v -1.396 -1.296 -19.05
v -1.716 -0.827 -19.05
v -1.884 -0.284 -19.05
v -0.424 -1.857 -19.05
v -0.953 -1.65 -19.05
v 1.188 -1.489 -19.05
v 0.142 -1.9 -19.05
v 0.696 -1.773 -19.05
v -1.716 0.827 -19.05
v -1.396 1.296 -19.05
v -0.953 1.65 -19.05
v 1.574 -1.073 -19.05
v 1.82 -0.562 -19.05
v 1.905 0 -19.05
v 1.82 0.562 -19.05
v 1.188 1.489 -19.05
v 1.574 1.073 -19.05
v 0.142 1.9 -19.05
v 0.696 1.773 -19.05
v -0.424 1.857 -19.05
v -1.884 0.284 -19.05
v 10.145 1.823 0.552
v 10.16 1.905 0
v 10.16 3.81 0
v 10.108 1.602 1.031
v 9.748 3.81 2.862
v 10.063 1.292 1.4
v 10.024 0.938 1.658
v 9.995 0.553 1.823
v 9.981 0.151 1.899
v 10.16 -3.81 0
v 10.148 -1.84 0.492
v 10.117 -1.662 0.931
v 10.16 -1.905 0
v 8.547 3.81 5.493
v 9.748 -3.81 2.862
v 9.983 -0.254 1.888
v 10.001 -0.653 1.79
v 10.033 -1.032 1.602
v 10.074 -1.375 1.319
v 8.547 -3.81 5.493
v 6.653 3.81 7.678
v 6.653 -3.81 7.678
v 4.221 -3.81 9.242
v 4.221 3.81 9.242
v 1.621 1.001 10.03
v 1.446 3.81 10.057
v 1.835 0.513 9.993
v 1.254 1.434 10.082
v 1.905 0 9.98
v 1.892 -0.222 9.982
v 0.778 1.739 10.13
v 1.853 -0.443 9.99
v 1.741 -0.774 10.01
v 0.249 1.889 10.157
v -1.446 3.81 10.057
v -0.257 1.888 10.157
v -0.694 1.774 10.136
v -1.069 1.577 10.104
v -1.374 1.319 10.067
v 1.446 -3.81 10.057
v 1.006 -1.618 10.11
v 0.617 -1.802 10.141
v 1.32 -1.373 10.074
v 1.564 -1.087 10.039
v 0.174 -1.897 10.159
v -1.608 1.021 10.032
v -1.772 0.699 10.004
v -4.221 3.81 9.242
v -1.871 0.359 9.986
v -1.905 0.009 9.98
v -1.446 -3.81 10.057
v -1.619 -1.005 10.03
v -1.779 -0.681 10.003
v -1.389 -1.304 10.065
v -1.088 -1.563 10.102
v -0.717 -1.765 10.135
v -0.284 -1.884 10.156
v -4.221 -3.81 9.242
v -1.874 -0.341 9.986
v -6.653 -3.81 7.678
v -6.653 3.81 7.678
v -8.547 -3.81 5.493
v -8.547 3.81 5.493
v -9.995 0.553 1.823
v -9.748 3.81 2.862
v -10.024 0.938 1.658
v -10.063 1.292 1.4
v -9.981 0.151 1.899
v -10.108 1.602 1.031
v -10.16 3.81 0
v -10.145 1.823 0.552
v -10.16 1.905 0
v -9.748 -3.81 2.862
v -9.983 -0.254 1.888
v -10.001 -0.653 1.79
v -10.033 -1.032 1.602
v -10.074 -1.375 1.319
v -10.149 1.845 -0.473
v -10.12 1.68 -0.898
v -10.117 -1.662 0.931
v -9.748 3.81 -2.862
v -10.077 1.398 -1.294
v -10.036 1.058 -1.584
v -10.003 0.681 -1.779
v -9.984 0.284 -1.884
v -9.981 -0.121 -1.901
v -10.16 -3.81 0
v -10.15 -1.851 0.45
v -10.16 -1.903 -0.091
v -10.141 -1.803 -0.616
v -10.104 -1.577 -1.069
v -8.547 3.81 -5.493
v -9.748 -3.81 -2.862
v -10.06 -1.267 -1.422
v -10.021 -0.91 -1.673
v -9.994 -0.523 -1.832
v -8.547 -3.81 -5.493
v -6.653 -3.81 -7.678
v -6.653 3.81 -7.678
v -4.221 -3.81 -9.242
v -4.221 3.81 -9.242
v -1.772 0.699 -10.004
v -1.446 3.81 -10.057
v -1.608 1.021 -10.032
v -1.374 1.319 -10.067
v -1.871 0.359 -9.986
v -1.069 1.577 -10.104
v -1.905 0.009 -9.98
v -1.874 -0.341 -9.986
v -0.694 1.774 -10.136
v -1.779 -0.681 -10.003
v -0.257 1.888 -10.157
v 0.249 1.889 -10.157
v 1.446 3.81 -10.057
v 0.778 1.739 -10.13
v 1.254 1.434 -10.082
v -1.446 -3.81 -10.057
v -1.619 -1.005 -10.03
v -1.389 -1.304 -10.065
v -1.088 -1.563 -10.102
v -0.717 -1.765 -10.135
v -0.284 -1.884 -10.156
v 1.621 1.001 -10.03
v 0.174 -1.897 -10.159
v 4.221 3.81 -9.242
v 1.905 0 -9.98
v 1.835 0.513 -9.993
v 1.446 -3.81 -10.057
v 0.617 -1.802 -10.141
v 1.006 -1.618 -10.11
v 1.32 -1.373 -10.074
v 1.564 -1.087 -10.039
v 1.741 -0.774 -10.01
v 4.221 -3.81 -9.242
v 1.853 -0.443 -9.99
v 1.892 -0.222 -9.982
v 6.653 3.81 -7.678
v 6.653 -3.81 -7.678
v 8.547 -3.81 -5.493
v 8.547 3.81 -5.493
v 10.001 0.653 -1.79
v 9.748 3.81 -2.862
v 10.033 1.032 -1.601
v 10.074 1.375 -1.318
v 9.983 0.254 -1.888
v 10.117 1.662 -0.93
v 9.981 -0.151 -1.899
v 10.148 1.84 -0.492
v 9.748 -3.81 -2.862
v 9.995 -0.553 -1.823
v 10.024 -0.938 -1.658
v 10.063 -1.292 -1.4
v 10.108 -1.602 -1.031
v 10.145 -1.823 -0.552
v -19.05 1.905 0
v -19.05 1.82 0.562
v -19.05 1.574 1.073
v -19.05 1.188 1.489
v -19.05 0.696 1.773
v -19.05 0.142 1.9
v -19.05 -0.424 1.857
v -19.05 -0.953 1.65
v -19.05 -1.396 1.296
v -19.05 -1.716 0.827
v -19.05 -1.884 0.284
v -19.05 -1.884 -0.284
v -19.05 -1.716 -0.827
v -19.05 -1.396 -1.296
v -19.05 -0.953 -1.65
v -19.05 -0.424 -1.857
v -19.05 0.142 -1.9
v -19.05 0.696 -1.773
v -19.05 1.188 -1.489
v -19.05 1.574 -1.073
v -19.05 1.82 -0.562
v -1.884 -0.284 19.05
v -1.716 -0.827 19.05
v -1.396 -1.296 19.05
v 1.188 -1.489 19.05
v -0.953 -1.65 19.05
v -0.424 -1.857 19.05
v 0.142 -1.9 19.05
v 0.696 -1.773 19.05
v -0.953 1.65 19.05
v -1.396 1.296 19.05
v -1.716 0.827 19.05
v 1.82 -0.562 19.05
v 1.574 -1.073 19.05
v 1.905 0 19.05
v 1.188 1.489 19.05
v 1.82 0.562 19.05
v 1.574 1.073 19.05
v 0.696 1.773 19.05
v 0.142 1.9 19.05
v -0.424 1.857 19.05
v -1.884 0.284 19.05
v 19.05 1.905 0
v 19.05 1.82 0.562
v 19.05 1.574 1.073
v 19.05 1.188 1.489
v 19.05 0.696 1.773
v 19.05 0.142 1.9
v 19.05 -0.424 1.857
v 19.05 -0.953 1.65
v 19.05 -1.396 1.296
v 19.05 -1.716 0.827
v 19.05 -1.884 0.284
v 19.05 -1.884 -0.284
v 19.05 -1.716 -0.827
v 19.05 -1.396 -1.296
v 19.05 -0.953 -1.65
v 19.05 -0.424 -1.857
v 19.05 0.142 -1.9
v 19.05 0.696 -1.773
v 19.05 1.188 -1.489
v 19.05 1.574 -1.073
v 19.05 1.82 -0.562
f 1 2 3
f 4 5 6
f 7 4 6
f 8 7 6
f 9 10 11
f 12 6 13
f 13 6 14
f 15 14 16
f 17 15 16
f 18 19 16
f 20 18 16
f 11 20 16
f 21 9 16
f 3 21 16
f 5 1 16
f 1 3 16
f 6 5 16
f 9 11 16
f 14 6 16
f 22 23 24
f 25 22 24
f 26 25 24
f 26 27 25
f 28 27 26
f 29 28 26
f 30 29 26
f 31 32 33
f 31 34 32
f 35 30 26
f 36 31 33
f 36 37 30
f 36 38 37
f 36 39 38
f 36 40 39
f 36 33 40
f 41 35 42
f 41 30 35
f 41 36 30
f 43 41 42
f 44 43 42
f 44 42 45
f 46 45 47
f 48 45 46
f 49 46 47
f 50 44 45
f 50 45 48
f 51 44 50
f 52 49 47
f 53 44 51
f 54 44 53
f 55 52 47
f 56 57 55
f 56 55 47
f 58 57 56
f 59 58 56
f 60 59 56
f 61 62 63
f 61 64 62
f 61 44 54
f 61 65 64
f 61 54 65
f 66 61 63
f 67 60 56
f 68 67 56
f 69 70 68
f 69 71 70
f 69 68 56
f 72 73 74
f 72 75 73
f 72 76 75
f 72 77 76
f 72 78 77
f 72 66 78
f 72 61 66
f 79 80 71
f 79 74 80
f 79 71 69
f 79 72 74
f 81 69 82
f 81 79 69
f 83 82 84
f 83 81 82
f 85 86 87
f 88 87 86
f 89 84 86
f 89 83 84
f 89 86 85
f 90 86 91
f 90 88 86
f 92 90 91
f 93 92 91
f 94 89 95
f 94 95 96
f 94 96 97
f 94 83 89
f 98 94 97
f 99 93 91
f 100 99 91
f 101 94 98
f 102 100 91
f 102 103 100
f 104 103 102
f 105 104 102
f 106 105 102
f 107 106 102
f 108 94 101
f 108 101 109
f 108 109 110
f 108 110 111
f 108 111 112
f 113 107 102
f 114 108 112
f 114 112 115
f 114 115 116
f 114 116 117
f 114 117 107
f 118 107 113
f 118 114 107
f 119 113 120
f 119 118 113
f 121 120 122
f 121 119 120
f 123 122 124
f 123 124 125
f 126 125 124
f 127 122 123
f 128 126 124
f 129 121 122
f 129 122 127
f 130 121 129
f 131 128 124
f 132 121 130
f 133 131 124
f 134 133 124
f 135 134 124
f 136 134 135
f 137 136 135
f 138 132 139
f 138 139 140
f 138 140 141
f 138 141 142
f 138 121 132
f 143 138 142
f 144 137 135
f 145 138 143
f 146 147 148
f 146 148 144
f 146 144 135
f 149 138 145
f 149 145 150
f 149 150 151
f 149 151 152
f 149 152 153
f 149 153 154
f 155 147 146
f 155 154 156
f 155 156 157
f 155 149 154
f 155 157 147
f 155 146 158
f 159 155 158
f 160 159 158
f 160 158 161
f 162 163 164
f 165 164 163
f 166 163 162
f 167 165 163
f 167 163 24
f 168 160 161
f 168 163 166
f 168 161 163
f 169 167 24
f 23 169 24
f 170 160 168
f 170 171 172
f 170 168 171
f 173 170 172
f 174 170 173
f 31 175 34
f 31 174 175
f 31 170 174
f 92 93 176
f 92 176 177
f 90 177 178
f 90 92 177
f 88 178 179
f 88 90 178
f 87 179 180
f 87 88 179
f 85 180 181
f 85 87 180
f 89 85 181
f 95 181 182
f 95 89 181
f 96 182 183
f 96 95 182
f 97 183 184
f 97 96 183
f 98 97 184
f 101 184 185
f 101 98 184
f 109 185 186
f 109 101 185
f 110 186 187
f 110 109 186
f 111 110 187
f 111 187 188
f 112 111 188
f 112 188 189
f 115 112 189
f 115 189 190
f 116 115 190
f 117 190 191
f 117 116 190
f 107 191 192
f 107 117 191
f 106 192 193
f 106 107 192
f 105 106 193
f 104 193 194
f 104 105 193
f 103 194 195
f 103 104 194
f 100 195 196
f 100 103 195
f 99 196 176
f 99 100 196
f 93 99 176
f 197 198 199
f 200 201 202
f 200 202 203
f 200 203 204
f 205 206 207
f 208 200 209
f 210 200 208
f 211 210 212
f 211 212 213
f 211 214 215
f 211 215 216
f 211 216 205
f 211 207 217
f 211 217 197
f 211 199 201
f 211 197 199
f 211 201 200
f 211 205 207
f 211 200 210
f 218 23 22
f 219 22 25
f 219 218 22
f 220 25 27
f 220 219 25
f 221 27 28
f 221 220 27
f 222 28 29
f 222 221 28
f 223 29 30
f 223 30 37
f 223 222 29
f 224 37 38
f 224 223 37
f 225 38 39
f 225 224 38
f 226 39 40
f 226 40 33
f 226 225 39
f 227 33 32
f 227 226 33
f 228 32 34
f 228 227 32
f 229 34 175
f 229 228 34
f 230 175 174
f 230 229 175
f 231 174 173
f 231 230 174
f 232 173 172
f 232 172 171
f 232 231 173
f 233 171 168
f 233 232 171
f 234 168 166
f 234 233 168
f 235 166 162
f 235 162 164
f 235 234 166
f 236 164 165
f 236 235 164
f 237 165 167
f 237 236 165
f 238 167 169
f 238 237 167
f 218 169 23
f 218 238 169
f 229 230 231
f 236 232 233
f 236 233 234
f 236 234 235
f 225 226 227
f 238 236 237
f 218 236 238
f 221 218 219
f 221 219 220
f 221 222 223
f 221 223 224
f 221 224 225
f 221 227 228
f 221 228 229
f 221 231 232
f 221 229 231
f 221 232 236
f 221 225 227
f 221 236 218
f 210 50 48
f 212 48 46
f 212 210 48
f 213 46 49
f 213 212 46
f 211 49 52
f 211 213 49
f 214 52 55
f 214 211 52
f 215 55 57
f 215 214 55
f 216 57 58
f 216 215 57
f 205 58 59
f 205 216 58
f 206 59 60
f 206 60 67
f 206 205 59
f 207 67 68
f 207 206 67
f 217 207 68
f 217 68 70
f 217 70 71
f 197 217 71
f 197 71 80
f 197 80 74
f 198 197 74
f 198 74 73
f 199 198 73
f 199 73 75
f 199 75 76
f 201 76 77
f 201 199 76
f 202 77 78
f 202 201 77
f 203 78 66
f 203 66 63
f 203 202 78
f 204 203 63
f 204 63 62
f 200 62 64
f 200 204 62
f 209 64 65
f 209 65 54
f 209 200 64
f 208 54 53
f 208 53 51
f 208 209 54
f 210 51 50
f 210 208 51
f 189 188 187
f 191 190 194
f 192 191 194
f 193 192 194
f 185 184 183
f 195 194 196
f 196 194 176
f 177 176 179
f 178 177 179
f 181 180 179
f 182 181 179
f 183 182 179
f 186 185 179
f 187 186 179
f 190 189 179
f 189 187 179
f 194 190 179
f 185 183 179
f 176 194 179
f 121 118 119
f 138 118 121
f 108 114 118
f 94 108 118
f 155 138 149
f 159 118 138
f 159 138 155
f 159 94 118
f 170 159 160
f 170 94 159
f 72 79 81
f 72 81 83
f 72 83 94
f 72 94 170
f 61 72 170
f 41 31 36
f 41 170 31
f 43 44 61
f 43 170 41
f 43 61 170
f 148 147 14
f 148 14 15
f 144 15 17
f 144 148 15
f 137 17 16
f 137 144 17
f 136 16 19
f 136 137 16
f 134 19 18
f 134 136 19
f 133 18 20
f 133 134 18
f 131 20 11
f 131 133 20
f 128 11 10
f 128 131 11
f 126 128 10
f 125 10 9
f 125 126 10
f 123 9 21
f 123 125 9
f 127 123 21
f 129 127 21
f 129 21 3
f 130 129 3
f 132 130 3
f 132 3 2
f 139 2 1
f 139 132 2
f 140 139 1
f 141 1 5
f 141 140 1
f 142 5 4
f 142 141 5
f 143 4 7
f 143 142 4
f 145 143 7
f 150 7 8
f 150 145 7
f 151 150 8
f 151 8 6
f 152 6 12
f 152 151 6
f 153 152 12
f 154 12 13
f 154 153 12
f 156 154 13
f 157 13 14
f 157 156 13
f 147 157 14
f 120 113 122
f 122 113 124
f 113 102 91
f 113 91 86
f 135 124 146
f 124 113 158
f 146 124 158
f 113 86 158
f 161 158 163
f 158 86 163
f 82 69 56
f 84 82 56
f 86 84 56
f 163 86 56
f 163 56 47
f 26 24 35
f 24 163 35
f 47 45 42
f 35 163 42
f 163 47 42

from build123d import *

# Parameters (mm, degrees)
F0_R     = 10.16
F1_DEPTH = 3.81
F2_R     = 1.905
F3_DEPTH = 19.05
F4_R     = 1.905
F5_DEPTH = 19.05


with BuildPart() as f1:
    # F0 (on Front) → F1 (new body, symmetric)
    with BuildSketch(Plane.XZ):
        Circle(F0_R)
    extrude(amount=F1_DEPTH, both=True)

    # F2 (on Top) → F3 (join, symmetric)
    with BuildSketch(Plane.XY):
        Circle(F2_R)
    extrude(amount=F3_DEPTH, both=True)

    # F4 (on Right) → F5 (join, symmetric)
    with BuildSketch(Plane.YZ):
        Circle(F4_R)
    extrude(amount=F5_DEPTH, both=True)


solid = f1.part
